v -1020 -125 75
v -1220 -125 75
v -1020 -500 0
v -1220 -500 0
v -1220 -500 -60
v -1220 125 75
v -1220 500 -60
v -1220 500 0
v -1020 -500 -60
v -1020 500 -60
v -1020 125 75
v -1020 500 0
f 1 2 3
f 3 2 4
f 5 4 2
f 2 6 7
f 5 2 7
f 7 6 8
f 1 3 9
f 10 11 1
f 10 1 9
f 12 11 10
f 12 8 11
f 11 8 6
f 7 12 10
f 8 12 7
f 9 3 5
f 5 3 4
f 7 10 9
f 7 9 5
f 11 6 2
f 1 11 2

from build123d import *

# Parameters (mm, degrees)
BOSS_EXTRUDE1_DEPTH = 200
SKETCH4_W           = 200
SKETCH4_H           = 1000
BOSS_EXTRUDE2_DEPTH = 60


with BuildPart() as part:
    # Sketch3 → Boss-Extrude1 (new body)
    with BuildSketch(Plane.ZY.offset(1220)):
        Polygon((0, 500), (75, 125), (75, -125), (0, -500), align=None)
    extrude(amount=-BOSS_EXTRUDE1_DEPTH)

    # Sketch4 → Boss-Extrude2 (add)
    with BuildSketch(Plane(origin=(0, 0, 0), x_dir=(-1, 0, 0), z_dir=(0, 0, -1))):
        with Locations((1120, 0)):
            Rectangle(SKETCH4_W, SKETCH4_H)
    extrude(amount=BOSS_EXTRUDE2_DEPTH)


solid = part.part
